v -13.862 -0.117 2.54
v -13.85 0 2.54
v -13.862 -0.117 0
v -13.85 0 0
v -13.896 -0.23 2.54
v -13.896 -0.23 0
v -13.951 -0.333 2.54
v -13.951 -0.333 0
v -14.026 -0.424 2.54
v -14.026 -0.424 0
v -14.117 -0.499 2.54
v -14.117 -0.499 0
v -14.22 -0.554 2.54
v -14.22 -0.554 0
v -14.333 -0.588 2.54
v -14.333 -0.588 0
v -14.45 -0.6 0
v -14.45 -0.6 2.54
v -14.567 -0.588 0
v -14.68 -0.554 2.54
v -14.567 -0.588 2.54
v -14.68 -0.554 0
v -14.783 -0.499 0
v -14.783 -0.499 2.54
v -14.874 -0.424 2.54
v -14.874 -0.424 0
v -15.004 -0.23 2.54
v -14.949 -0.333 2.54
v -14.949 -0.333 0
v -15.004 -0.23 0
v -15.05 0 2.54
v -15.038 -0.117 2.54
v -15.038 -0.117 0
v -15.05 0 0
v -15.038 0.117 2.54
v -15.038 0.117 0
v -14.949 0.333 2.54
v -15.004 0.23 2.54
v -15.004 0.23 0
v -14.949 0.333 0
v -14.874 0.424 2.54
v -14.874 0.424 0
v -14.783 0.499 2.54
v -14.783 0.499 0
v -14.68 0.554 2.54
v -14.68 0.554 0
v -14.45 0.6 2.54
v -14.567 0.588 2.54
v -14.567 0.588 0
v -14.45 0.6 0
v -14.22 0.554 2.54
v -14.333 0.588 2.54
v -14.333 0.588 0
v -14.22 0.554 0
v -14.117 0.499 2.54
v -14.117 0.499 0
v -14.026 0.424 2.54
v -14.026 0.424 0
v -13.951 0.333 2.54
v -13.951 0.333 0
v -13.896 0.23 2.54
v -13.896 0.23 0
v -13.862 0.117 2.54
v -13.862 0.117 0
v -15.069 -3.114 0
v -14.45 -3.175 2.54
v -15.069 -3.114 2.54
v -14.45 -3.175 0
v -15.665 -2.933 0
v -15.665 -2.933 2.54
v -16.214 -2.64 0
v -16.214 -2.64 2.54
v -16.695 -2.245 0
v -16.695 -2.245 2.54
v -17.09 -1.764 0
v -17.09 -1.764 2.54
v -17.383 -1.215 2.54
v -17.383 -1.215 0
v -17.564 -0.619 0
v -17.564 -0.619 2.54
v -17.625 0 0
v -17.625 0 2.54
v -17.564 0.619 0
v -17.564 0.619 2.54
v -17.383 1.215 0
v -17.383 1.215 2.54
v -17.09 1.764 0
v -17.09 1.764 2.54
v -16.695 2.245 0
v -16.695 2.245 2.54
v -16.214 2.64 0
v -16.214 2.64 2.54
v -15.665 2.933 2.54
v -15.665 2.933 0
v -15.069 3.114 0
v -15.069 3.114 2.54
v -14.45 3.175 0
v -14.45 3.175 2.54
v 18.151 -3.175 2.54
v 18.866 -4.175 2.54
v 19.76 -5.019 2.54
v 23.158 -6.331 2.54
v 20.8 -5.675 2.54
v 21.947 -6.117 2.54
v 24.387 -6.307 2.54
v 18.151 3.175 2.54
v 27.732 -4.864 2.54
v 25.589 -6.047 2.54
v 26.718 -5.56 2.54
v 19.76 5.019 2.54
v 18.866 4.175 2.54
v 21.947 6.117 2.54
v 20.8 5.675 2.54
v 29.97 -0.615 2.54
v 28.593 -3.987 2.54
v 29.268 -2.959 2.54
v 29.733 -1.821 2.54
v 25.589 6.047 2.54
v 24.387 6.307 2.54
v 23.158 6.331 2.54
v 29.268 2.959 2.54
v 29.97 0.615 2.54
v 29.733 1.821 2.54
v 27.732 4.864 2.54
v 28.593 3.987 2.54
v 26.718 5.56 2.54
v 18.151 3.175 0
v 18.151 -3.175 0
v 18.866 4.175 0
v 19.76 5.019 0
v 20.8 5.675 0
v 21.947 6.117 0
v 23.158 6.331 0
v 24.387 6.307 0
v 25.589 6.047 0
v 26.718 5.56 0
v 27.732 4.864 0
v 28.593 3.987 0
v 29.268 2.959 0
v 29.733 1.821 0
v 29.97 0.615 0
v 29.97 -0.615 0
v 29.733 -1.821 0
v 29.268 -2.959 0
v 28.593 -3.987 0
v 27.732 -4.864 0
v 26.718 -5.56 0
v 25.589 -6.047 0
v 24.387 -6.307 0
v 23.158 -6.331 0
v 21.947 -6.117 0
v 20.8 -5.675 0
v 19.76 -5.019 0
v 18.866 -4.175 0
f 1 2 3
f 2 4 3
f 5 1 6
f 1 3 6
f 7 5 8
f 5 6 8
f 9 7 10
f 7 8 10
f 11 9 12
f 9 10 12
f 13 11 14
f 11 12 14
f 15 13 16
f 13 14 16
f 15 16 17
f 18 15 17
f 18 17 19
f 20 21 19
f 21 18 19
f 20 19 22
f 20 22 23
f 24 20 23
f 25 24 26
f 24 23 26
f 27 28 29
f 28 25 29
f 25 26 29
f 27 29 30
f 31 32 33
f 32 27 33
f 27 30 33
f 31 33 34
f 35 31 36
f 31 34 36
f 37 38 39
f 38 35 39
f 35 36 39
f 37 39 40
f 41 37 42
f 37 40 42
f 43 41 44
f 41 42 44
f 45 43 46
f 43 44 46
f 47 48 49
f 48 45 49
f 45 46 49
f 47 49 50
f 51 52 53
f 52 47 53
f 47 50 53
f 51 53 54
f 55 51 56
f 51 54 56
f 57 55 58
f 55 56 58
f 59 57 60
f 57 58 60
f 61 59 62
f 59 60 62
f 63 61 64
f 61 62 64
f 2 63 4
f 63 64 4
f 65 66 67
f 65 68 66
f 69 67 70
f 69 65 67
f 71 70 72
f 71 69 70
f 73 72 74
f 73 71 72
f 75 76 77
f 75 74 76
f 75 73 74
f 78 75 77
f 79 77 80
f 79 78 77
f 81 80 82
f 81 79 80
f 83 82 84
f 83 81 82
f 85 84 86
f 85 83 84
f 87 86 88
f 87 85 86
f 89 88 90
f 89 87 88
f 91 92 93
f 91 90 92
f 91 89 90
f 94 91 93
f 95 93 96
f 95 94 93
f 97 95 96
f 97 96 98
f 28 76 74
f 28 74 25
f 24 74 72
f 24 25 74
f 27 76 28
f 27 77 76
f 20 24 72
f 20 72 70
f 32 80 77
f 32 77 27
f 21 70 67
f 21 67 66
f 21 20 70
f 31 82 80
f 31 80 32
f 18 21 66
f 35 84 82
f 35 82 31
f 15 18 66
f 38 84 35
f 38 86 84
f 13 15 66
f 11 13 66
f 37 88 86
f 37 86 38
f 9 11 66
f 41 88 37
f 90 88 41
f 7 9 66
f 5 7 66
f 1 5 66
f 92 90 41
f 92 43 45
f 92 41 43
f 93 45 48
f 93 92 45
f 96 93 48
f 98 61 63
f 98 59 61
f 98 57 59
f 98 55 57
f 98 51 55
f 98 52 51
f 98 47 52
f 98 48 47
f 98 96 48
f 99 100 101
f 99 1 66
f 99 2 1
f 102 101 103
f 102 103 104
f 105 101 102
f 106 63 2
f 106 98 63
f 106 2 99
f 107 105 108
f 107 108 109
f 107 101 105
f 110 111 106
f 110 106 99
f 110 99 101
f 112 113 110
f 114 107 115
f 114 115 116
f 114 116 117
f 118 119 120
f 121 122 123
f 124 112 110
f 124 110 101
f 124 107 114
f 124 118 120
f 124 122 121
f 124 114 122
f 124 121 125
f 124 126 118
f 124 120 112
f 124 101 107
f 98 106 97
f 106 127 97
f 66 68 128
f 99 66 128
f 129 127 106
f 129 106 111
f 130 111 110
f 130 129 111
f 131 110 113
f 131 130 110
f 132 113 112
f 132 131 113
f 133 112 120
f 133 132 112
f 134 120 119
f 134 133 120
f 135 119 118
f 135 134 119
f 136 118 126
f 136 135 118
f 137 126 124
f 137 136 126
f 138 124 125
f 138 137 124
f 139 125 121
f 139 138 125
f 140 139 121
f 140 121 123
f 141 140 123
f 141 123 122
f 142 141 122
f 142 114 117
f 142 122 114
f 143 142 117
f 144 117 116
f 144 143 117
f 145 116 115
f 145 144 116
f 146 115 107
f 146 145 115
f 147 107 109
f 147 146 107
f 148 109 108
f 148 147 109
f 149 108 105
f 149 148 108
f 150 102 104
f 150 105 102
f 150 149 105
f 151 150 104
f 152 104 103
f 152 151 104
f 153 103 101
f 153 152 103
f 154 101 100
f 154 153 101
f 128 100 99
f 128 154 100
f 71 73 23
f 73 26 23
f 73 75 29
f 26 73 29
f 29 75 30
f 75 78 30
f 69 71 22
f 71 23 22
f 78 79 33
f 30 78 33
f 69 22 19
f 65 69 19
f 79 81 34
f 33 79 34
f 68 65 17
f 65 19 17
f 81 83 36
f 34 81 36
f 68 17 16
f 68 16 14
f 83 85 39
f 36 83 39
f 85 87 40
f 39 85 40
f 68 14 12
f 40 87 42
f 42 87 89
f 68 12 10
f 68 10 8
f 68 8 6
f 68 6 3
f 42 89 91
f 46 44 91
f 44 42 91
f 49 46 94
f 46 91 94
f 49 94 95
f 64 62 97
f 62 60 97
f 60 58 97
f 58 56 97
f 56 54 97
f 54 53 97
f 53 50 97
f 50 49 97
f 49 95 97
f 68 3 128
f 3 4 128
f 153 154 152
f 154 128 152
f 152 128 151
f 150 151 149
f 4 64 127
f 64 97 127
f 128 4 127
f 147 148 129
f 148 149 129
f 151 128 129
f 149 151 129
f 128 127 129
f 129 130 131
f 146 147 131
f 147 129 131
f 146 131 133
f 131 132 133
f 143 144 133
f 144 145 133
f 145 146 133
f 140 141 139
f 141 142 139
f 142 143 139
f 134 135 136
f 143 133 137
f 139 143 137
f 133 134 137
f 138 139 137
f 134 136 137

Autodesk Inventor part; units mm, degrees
ref_plane "YZ Plane" through (0, 0, 0) normal (1, 0, 0) x (0, 1, 0)
ref_plane "XZ Plane" through (0, 0, 0) normal (0, 1, 0) x (-1, 0, 0)
ref_plane "XY Plane" through (0, 0, 0) normal (0, 0, 1) x (1, 0, 0)
sketch "Sketch1" plane through (0, 0, 0) normal (0, 0, 1) x (1, 0, 0)
  circle A0 centre (-14.45, 0) radius 0.6 projected
  line L0 (-14.45, 0) -> (23.65, 0) construction
  line L1 (-14.45, -3.175) -> (23.65, -3.175)
  line L2 (23.65, 3.175) -> (-14.45, 3.175)
  arc A1 (-14.45, 3.175) -> (-14.45, -3.175) centre (-14.45, 0) ccw
  arc A2 (23.65, -3.175) -> (23.65, 3.175) centre (23.65, 0) ccw
  line L3 (-14.45, 0) -> (23.65, 0) construction
  circle A3 centre (23.65, 0) radius 6.35
  point P0 (0, 0)
  point P1 (4.6, 0)
  point P2 (18.1507, -3.175)
  point P3 (18.1507, 3.175)
  dimension "d0" = 38.1
  dimension "d1" = 0
  dimension "d2" = 6.35
  dimension "d3" = 12.7
extrude "Extrusion1" add sketch "Sketch1" along normal blind 2.54
properties part number "ShutterStop"
